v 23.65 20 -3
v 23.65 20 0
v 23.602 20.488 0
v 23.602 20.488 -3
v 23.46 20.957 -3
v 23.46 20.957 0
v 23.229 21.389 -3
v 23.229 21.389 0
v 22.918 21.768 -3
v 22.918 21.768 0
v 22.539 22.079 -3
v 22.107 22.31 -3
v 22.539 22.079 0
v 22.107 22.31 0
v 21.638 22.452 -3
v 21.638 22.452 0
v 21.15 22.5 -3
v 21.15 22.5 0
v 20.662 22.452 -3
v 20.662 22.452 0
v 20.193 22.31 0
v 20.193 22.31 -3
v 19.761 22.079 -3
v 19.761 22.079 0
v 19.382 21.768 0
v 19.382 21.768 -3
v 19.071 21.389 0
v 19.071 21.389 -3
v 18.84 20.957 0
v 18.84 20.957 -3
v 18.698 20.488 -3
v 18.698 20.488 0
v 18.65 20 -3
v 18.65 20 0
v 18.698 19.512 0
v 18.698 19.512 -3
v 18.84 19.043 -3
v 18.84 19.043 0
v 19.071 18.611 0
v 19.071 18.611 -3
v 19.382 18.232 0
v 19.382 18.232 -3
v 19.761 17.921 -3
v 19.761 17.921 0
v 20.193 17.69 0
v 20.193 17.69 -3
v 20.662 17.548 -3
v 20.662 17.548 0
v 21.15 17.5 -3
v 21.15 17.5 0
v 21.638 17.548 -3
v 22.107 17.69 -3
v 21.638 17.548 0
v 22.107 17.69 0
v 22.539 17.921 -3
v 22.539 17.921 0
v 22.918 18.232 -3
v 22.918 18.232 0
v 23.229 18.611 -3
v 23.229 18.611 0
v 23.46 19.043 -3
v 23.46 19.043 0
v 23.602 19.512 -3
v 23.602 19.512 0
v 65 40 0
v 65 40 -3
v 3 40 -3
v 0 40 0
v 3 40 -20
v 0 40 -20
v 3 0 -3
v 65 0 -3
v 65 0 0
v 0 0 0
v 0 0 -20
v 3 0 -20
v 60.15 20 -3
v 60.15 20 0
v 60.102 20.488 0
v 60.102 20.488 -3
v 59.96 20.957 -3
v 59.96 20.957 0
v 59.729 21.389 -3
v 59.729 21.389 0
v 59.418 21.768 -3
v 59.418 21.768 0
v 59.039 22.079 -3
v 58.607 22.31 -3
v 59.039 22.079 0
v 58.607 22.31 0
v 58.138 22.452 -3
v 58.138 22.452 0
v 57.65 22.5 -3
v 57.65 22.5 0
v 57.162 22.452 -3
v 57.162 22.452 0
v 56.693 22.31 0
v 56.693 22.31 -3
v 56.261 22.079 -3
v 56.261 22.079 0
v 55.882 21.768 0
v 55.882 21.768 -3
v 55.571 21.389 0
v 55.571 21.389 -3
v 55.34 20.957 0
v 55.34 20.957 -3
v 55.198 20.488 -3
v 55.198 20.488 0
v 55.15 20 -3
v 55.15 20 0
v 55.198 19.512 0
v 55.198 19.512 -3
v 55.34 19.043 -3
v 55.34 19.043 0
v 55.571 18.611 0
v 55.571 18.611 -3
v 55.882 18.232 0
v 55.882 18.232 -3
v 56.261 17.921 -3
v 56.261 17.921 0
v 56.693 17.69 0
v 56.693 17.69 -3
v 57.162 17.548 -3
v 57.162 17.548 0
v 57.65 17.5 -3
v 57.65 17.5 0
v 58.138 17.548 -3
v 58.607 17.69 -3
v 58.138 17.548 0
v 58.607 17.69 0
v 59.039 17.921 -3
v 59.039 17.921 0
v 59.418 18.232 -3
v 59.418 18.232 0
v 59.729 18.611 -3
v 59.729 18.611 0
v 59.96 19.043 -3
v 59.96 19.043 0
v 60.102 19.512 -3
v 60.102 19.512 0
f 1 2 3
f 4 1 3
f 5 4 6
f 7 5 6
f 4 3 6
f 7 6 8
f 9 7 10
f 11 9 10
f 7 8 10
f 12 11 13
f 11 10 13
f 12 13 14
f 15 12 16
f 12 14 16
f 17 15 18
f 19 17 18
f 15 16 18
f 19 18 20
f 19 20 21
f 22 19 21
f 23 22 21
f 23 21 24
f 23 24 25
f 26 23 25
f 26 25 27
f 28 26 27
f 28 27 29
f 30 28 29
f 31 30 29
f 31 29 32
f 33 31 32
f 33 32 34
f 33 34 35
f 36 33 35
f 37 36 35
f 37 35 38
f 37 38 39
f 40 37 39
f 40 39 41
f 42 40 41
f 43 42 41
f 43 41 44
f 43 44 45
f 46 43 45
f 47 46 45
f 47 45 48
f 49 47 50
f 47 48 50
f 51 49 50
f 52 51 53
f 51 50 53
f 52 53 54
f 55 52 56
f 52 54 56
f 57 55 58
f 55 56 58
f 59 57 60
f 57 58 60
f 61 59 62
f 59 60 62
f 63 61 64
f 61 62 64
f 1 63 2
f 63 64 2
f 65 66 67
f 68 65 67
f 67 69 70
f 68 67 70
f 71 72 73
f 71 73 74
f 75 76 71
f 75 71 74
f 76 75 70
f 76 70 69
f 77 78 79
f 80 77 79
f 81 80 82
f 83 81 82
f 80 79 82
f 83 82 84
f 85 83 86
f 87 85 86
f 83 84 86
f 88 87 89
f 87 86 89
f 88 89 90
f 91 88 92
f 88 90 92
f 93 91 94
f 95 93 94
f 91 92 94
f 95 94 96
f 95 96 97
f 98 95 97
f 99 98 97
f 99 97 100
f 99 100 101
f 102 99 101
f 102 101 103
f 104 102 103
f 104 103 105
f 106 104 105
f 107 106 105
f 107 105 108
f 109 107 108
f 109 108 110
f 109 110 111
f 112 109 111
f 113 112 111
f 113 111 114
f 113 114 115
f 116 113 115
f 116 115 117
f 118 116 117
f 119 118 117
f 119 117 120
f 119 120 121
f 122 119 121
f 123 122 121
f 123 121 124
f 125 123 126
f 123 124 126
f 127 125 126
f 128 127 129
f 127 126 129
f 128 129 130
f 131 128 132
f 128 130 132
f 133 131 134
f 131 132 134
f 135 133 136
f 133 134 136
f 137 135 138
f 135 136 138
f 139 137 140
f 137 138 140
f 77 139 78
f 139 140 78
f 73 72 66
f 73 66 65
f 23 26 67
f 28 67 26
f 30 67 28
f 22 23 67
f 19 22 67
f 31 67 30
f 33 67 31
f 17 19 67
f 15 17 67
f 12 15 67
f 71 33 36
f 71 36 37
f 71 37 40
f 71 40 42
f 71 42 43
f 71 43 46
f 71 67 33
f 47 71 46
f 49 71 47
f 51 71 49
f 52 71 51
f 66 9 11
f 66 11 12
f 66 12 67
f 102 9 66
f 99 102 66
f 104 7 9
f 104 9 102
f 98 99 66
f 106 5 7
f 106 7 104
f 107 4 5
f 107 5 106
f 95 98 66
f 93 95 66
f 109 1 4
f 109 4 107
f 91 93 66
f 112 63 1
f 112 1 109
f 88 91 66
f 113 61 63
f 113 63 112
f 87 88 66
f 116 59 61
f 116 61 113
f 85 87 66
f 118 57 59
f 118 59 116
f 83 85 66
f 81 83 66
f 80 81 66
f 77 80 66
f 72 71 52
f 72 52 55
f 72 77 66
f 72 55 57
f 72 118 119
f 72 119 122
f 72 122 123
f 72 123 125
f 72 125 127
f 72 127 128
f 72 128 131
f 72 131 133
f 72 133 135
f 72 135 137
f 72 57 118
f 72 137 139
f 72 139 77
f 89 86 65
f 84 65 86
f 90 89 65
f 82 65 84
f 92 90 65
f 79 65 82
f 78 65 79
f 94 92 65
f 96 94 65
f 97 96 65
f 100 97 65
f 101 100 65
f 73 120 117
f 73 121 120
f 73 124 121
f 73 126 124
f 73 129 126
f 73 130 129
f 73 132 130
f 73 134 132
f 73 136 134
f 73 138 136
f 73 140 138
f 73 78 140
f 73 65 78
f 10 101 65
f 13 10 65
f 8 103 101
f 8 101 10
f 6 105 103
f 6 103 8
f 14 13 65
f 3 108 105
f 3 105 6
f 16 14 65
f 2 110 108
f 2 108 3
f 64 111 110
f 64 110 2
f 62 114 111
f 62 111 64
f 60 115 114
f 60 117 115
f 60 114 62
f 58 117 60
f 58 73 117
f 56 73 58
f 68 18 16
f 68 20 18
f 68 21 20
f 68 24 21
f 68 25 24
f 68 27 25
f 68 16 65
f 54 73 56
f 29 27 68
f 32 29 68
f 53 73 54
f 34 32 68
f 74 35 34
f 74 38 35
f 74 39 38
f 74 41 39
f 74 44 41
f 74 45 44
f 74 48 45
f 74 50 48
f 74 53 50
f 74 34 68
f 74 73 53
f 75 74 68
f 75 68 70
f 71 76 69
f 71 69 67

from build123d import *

# Parameters (mm, degrees)
BOSS_EXTRUDE1_DEPTH = 40
SKETCH2_R           = 2.5
CUT_EXTRUDE1_DEPTH  = 79.89866919


with BuildPart() as part:
    # Sketch1 → Boss-Extrude1 (new body)
    with BuildSketch(Plane(origin=(0, 0, 0), x_dir=(1, 0, 0), z_dir=(0, 1, 0))):
        Polygon((0, 0), (0, 20), (3, 20), (3, 3), (65, 3), (65, 0), align=None)
    extrude(amount=BOSS_EXTRUDE1_DEPTH)

    # Sketch2 → Cut-Extrude1 (cut, through all)
    with BuildSketch(Plane.XY):
        with Locations((21.15, 20)):
            Circle(SKETCH2_R)
        with Locations((57.65, 20)):
            Circle(SKETCH2_R)
    extrude(amount=-CUT_EXTRUDE1_DEPTH, mode=Mode.SUBTRACT)


solid = part.part
